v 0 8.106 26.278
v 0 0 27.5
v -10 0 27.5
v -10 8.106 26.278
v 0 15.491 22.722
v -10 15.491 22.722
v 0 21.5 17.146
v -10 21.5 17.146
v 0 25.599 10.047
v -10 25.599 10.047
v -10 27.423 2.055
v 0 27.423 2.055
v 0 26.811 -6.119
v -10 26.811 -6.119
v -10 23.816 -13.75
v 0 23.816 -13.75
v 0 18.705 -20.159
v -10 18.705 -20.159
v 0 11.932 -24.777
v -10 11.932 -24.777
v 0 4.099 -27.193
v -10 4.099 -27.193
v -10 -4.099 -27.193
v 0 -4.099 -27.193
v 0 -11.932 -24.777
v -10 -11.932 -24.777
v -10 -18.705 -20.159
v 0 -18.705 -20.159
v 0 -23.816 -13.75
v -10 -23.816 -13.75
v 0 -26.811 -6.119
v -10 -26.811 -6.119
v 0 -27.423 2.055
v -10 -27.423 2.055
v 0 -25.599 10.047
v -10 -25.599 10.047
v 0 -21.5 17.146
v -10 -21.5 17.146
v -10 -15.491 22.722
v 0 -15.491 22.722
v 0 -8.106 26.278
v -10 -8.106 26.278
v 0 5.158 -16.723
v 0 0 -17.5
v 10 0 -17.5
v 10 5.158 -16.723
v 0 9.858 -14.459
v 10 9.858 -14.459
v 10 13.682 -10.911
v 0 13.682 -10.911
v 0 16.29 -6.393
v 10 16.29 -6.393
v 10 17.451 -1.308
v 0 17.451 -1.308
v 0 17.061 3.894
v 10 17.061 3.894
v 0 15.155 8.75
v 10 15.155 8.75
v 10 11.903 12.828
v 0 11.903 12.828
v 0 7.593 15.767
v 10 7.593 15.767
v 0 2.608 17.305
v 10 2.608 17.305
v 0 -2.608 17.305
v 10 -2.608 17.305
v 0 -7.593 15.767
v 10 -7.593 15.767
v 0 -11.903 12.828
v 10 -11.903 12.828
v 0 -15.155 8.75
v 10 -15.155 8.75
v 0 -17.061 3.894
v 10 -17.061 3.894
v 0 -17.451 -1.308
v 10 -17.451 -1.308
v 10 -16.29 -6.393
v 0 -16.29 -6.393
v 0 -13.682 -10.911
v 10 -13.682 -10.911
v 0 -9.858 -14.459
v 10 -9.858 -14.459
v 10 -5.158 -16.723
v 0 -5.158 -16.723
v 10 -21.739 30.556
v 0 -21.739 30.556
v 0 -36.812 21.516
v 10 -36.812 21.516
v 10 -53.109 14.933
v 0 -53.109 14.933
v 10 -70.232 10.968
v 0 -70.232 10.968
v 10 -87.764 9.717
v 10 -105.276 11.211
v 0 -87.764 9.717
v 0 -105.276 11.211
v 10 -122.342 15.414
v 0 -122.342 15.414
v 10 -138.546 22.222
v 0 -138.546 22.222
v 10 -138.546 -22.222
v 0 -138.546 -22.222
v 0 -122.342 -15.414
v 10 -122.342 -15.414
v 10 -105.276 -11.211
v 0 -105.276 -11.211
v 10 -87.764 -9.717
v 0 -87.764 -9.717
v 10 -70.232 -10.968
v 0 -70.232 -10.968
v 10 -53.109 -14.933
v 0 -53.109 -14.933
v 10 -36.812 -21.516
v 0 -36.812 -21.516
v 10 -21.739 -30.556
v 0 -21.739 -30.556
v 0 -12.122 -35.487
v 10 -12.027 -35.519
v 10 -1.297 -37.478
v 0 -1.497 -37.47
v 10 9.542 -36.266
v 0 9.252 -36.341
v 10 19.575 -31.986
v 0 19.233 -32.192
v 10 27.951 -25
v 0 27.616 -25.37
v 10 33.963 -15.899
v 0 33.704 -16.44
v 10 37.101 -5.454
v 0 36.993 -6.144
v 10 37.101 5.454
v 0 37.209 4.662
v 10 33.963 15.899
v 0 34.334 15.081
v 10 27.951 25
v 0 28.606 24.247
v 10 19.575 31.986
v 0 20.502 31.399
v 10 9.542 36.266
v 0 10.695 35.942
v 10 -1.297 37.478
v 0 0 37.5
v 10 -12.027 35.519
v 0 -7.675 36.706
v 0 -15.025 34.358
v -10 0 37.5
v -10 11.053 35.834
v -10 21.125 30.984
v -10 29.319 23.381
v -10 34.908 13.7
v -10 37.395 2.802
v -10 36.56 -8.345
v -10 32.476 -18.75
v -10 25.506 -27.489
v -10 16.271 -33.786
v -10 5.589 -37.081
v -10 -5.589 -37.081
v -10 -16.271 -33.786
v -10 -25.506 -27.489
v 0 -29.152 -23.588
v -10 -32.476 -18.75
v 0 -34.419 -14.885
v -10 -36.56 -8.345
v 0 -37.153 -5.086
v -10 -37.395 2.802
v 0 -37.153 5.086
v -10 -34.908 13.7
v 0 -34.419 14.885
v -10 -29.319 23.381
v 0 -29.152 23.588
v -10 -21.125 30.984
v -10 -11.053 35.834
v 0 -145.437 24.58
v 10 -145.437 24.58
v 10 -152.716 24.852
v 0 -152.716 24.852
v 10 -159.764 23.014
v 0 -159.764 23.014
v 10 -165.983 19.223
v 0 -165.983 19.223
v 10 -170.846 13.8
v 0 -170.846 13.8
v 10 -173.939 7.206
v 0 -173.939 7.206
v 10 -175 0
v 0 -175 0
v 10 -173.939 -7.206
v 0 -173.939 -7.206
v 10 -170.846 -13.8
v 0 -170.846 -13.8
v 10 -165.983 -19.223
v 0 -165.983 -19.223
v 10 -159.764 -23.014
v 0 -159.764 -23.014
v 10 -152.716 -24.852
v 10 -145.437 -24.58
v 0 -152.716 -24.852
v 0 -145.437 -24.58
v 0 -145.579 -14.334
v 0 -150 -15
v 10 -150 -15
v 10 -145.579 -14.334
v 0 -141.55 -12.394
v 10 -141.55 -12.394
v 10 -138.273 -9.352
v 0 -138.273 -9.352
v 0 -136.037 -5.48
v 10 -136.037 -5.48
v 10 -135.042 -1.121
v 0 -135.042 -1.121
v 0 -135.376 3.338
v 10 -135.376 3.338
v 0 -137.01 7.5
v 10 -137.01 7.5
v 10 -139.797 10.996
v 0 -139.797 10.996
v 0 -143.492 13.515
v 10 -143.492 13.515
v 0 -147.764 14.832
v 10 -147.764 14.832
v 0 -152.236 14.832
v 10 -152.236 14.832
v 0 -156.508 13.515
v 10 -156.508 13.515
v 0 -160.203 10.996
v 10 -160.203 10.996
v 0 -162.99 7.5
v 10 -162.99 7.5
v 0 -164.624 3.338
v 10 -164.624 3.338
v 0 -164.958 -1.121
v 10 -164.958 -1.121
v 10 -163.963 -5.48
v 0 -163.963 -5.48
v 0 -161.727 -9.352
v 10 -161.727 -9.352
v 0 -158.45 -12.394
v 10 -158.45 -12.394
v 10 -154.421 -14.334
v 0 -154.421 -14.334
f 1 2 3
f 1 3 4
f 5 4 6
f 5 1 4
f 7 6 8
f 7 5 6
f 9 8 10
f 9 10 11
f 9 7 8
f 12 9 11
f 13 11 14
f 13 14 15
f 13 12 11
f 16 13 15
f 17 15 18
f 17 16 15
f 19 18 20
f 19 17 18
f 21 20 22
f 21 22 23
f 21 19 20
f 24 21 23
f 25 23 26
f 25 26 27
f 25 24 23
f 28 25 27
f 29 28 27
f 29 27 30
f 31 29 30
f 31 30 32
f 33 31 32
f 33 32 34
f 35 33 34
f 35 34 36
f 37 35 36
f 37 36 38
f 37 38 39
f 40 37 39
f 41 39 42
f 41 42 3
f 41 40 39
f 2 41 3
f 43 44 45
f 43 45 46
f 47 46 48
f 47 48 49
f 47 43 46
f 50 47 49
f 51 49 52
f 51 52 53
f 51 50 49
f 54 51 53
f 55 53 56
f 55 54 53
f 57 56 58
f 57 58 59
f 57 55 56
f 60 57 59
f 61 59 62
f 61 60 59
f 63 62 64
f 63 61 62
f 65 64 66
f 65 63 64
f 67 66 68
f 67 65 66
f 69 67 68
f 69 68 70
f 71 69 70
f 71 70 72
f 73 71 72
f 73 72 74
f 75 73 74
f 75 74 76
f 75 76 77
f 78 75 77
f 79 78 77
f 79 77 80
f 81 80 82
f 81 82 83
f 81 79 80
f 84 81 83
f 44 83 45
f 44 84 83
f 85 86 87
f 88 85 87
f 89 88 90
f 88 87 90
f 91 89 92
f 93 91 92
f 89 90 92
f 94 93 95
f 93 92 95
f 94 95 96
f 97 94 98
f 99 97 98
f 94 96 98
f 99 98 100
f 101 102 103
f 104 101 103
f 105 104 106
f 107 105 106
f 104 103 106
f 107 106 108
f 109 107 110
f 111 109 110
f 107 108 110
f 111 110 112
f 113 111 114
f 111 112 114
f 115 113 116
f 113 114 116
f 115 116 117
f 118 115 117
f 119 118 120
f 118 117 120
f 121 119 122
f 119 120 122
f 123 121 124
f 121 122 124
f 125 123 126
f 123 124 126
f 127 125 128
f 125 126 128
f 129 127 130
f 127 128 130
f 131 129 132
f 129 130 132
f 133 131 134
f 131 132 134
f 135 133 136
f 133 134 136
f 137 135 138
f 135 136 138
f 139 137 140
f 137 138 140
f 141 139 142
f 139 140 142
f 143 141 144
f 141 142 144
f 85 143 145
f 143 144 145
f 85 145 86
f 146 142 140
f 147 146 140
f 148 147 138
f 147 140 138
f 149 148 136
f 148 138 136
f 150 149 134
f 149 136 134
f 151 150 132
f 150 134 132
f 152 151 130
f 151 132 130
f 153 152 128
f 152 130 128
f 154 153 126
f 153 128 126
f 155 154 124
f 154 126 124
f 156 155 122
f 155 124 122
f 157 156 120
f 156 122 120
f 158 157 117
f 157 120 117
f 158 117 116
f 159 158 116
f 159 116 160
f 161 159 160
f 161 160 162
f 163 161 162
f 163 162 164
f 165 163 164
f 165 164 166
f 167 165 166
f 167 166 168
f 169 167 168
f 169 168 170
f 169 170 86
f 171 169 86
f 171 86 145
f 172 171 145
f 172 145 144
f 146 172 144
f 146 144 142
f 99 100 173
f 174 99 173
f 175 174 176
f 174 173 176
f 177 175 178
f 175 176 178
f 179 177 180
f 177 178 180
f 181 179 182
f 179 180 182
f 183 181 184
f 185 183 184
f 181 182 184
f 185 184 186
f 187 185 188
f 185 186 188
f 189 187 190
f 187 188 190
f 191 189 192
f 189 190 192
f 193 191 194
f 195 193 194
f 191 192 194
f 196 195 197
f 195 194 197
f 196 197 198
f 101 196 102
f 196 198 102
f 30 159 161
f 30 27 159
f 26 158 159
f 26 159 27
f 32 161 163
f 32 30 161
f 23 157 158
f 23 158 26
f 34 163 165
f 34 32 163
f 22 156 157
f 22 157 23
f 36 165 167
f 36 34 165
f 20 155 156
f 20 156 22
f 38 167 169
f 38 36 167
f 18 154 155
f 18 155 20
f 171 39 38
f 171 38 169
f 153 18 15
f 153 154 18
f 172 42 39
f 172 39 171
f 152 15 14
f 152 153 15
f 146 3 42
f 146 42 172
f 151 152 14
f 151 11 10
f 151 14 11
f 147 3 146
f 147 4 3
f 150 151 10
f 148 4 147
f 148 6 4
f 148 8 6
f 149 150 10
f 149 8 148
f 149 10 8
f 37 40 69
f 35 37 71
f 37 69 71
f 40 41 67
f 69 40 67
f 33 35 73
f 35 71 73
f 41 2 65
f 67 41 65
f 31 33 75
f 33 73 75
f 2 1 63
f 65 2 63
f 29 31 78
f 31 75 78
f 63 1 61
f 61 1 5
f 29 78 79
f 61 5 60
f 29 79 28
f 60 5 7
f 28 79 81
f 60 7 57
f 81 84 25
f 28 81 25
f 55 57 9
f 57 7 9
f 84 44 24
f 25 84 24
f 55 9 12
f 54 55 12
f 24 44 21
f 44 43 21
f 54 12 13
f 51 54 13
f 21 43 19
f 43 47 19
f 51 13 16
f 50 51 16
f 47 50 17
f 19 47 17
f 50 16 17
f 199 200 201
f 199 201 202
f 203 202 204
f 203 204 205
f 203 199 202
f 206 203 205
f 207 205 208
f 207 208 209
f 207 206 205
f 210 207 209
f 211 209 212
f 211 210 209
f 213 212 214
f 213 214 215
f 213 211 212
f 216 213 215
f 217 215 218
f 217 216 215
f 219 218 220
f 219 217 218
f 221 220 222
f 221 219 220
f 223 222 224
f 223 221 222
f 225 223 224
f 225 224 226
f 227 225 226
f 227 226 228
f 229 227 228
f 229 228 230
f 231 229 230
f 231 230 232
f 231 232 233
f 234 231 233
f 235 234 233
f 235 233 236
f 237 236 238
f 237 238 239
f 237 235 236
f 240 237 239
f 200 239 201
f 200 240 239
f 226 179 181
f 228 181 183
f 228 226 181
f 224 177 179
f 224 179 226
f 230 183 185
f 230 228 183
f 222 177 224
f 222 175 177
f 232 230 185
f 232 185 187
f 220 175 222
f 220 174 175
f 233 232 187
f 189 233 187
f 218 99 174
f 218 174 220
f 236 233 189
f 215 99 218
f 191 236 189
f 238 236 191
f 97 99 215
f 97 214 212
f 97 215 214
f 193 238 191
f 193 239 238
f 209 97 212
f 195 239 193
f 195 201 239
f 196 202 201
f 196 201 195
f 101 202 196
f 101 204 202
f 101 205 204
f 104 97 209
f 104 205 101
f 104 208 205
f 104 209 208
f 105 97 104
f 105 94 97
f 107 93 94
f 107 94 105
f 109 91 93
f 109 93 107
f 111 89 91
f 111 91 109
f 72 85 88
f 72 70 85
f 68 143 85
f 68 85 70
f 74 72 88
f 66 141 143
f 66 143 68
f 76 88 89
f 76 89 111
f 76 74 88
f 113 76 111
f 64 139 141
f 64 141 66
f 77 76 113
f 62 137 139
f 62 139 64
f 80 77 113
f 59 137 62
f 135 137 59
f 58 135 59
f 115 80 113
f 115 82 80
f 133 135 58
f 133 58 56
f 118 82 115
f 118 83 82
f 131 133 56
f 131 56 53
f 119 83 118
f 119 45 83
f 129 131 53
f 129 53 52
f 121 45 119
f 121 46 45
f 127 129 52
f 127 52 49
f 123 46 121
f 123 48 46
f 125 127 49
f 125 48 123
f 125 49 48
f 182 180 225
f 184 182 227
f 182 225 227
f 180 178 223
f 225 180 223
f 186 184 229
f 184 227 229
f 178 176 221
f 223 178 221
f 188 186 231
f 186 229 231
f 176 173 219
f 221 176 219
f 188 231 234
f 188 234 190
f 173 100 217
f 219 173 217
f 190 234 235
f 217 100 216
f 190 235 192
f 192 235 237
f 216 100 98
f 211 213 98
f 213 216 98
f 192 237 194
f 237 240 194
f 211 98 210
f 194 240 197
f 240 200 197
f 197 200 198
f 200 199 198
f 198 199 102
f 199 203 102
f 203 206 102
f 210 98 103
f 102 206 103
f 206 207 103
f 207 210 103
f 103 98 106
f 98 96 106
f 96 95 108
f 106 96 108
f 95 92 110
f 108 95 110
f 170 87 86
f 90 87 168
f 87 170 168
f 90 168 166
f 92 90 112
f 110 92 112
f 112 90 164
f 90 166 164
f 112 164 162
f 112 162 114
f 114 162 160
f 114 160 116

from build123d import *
from build123d.topology import SkipClean

# Parameters (mm, degrees)
SKETCH1_R           = 17.5
SKETCH1_R_2         = 15
BOSS_EXTRUDE1_DEPTH = 10
BOSS_EXTRUDE2_START = 10
SKETCH2_R           = 37.5
SKETCH2_R_2         = 27.5
BOSS_EXTRUDE2_DEPTH = 10


with BuildPart() as part:
    # Sketch1 → Boss-Extrude1 (new body)
    with BuildSketch(Plane(origin=(0, 0, 0), x_dir=(0, 0, -1), z_dir=(1, 0, 0))):
        with BuildLine():
            ThreePointArc((-30.555677848, -21.739377894), (-10, -78.973363491), (-22.221723794, -138.545961778))
            ThreePointArc((-22.221723794, -138.545961778), (0, -175), (22.221723794, -138.545961778))
            ThreePointArc((22.221723794, -138.545961778), (10, -78.973363491), (30.555677848, -21.739377894))
            ThreePointArc((30.555677848, -21.739377894), (0, 37.5), (-30.555677848, -21.739377894))
        make_face()
        Circle(SKETCH1_R, mode=Mode.SUBTRACT)
        with Locations((0, -150)):
            Circle(SKETCH1_R_2, mode=Mode.SUBTRACT)
    extrude(amount=BOSS_EXTRUDE1_DEPTH)

    # Sketch2 → Boss-Extrude2 (add)
    with SkipClean():  # the faces are left unmerged after this step: merging them gives an invalid solid
        with BuildSketch(Plane.ZY.offset(BOSS_EXTRUDE2_START)):
            Circle(SKETCH2_R)
            Circle(SKETCH2_R_2, mode=Mode.SUBTRACT)
        extrude(amount=-BOSS_EXTRUDE2_DEPTH)


solid = part.part
